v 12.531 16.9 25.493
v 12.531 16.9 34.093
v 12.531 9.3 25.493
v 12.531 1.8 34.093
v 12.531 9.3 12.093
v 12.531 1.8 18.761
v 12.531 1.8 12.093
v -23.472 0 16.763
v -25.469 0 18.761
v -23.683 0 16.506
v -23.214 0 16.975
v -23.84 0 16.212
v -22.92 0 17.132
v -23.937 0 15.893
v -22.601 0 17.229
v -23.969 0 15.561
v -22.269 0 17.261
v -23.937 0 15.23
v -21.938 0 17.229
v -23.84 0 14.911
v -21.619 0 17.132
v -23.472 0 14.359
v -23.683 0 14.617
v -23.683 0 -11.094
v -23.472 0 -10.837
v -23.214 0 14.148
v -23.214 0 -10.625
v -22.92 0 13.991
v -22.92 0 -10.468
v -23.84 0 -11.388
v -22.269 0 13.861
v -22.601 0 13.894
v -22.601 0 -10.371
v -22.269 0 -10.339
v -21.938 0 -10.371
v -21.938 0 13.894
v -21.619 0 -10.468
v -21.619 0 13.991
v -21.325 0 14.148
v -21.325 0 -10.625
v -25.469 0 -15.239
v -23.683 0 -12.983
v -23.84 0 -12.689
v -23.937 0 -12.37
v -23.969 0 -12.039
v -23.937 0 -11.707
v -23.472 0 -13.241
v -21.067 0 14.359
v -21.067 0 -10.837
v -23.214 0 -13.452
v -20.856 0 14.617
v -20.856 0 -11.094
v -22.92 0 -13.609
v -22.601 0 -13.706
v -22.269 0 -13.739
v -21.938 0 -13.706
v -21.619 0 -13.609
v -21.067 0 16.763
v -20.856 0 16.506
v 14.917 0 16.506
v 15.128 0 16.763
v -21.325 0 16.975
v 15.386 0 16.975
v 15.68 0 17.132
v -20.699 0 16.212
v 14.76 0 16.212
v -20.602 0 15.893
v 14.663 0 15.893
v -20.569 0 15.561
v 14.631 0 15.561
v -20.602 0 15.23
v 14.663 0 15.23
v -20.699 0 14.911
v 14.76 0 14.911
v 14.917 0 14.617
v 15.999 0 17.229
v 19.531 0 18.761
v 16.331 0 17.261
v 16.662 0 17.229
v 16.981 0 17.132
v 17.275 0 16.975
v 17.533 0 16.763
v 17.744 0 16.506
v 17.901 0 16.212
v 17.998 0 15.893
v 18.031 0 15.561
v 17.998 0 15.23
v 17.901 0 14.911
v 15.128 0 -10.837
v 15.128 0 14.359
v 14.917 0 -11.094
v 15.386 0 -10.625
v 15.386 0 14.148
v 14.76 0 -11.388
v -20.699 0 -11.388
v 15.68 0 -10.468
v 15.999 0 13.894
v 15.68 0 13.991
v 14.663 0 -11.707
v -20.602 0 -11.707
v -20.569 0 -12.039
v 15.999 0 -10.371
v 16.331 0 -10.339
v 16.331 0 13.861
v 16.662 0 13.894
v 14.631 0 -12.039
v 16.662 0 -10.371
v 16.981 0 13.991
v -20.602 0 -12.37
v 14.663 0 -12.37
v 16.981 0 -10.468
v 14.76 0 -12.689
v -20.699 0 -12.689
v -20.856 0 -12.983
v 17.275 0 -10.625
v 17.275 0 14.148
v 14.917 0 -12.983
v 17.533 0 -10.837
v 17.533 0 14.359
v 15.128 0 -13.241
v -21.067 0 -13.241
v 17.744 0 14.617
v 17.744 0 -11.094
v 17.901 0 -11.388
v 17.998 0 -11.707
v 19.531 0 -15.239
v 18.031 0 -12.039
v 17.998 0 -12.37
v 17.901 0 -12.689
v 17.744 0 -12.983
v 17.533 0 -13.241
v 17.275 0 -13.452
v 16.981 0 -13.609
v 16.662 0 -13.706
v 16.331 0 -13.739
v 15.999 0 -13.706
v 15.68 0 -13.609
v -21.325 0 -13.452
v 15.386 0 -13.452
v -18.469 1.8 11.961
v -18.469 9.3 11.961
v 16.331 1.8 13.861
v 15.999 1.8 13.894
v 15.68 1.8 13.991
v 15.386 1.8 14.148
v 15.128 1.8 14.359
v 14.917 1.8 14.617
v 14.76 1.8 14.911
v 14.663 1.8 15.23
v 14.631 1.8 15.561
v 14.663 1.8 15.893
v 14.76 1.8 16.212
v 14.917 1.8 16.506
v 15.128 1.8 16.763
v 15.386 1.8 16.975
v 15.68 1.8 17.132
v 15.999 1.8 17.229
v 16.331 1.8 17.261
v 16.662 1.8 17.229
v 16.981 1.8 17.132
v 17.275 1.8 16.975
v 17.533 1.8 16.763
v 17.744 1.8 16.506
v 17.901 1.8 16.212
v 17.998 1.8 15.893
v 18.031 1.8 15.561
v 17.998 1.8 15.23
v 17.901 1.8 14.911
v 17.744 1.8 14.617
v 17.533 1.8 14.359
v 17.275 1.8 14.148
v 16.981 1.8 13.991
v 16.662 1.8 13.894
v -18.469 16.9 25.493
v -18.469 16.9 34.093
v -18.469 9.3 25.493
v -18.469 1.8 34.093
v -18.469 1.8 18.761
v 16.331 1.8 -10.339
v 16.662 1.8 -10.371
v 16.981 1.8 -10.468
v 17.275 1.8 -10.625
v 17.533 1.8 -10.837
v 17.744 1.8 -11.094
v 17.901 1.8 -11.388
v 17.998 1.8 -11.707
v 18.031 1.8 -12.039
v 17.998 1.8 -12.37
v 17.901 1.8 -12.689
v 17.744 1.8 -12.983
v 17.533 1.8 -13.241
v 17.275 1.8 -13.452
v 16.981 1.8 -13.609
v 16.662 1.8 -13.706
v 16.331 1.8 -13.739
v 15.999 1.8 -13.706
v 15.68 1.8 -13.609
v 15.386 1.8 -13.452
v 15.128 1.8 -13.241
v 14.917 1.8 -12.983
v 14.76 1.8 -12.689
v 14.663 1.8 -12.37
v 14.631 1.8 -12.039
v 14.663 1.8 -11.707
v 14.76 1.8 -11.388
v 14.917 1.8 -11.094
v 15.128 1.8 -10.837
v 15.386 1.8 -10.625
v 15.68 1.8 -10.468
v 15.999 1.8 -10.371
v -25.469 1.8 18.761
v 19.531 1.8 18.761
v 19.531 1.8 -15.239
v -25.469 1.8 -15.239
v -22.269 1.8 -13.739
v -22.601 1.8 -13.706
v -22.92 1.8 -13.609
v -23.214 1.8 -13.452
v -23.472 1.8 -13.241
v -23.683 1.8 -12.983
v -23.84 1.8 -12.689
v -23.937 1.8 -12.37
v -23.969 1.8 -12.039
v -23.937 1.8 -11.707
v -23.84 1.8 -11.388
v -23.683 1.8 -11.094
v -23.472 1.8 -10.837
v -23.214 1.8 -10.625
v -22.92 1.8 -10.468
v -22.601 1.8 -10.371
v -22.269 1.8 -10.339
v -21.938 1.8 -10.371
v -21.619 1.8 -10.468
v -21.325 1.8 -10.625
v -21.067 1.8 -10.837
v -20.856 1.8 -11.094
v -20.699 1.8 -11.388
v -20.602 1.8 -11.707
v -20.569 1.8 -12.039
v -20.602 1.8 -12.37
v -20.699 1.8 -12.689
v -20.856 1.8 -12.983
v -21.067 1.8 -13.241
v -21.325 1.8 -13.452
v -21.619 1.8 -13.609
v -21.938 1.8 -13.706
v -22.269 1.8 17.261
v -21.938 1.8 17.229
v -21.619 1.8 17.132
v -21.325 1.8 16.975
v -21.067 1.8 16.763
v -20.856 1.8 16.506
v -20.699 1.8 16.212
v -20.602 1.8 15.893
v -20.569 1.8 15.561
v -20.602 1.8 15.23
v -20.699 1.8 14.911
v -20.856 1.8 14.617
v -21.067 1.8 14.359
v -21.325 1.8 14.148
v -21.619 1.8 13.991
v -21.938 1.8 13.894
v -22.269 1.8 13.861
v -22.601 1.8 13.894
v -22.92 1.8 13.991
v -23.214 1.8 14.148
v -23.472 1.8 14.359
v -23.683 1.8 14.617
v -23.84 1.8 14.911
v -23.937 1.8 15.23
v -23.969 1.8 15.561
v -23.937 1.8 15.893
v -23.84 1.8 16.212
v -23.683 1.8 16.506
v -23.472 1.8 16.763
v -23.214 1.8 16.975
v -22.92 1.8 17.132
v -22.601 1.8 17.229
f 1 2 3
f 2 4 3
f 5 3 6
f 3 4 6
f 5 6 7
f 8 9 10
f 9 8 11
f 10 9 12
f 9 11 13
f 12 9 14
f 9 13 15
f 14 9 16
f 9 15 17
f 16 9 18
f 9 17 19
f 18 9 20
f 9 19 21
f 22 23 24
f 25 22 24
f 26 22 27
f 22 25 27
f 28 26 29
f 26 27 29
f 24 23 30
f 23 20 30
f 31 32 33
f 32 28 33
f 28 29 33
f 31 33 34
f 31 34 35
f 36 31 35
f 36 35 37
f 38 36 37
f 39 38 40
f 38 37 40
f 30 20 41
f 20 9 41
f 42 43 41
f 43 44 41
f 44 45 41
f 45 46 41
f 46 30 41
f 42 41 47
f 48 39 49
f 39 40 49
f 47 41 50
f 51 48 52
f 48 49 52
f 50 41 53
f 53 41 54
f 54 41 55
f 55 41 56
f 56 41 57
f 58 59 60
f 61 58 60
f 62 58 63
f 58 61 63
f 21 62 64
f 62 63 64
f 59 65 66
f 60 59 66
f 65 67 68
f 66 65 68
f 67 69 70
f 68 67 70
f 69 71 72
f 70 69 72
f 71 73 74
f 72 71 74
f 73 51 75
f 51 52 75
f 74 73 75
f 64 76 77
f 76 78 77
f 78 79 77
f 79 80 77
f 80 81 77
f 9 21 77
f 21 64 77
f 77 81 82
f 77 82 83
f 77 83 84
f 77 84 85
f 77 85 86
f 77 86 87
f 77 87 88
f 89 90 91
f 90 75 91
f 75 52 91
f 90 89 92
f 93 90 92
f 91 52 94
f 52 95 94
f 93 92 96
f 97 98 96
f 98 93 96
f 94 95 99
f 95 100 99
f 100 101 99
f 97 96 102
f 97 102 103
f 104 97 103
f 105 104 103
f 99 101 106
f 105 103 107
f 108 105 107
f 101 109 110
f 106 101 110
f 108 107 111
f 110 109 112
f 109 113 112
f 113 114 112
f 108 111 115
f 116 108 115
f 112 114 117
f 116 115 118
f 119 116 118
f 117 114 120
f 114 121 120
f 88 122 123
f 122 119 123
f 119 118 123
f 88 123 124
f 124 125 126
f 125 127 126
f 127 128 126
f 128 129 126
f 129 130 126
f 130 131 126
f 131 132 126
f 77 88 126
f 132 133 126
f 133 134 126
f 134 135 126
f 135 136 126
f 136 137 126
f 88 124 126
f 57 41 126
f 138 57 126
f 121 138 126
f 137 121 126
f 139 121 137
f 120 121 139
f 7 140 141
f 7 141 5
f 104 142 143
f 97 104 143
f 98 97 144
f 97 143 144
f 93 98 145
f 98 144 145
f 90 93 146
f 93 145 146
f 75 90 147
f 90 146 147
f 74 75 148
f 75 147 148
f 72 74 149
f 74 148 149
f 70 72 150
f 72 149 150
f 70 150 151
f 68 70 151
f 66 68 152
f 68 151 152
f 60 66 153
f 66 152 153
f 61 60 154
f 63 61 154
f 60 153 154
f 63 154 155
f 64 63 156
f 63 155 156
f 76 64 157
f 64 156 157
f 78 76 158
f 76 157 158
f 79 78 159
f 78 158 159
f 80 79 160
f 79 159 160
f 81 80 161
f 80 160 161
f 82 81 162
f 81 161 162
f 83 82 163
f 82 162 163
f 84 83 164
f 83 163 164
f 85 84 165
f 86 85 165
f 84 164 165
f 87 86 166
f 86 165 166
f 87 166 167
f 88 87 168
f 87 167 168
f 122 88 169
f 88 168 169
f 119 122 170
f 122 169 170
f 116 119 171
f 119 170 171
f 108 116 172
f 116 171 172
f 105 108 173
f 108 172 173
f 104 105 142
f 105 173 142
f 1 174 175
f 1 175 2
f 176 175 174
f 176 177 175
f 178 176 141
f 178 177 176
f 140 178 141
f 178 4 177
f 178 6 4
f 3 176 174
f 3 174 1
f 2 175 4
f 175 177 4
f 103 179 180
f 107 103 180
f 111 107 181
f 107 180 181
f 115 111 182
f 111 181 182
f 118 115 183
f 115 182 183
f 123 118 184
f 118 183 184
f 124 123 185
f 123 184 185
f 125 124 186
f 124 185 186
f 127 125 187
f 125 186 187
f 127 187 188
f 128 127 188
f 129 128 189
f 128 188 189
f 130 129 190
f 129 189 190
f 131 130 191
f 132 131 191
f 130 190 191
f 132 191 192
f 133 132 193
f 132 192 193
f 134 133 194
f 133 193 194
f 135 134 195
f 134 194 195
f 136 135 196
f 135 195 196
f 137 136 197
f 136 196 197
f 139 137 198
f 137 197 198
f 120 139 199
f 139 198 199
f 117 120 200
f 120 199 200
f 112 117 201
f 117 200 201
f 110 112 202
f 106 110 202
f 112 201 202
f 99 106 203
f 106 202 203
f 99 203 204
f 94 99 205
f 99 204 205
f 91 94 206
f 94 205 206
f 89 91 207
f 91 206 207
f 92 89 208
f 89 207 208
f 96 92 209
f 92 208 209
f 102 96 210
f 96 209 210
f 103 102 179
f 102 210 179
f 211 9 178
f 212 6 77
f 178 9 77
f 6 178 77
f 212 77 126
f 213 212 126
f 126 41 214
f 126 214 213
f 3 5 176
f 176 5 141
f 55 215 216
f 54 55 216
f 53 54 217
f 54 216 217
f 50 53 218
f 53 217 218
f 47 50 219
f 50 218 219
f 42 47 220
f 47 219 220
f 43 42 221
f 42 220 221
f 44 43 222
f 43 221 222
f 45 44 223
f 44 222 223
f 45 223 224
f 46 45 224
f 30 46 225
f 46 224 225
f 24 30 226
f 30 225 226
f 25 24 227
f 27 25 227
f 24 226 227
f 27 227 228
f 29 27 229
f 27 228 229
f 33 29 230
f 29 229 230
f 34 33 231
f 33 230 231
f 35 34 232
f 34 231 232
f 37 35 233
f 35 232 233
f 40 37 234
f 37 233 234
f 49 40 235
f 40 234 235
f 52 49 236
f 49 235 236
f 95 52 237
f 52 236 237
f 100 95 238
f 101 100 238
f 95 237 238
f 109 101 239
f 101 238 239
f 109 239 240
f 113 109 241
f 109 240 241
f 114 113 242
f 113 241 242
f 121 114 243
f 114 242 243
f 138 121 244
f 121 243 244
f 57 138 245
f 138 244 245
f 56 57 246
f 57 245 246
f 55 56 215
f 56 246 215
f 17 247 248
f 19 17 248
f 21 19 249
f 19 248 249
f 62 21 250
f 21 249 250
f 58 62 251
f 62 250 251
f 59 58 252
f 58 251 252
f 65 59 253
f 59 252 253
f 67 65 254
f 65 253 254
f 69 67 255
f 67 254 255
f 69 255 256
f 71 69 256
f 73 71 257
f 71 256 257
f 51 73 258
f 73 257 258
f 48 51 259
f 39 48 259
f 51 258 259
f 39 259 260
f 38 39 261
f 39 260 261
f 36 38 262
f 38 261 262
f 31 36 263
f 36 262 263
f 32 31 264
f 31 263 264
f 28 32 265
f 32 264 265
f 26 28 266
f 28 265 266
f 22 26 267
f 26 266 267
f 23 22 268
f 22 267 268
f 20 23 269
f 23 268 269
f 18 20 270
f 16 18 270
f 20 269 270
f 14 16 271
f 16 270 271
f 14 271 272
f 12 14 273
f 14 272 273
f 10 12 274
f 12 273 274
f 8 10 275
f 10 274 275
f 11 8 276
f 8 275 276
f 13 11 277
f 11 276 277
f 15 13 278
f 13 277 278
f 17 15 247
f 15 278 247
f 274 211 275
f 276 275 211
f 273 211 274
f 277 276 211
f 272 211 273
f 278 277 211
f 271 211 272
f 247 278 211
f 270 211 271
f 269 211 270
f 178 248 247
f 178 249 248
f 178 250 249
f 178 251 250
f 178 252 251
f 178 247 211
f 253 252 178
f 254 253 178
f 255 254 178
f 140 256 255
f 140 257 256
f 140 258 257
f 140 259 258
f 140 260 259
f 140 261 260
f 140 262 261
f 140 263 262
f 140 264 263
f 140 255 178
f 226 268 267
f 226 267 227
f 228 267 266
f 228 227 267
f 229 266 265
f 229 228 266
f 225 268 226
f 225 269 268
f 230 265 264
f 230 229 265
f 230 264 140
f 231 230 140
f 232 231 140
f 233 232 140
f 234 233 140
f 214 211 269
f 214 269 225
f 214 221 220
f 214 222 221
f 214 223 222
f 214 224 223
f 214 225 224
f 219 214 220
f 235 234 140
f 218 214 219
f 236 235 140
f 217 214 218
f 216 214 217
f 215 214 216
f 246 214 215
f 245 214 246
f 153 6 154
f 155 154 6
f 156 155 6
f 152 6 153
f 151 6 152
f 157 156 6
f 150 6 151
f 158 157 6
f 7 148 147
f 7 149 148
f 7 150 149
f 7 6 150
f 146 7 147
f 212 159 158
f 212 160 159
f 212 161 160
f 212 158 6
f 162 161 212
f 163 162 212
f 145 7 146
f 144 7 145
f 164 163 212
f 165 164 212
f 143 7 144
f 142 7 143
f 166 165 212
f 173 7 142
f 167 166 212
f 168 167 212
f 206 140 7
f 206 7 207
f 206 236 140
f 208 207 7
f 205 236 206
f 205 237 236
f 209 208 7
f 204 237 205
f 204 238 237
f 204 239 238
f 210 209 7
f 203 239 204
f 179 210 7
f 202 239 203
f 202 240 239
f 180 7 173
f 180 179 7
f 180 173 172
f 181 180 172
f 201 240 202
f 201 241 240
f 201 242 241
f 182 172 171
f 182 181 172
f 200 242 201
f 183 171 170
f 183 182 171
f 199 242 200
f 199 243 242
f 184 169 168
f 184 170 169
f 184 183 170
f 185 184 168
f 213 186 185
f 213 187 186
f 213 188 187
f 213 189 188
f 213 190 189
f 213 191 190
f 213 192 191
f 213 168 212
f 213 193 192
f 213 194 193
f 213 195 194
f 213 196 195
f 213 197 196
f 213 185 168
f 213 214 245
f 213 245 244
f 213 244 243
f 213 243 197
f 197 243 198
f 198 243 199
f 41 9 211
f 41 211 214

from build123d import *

# Parameters (mm, degrees)
SZKIC1_W                    = 45
SZKIC1_H                    = 34
DODANIE_WYCI_GNI_CIE1_DEPTH = 1.8
SZKIC2_R                    = 1.7
WYTNIJ_WYCI_GNI_CIE1_DEPTH  = 1.8
DODANIE_WYCI_GNI_CIE2_DEPTH = 7.5
SZKIC4_W                    = 31
SZKIC4_H                    = 8.6
DODANIE_WYCI_GNI_CIE3_DEPTH = 7.6


with BuildPart() as part:
    # Szkic1 → Dodanie-wyciągnięcie1 (new body)
    with BuildSketch(Plane(origin=(0, 0, 0), x_dir=(1, 0, 0), z_dir=(0, 1, 0))):
        with Locations((-2.969453376, -1.761254019)):
            Rectangle(SZKIC1_W, SZKIC1_H)
    extrude(amount=DODANIE_WYCI_GNI_CIE1_DEPTH)

    # Szkic2 → Wytnij-wyciągnięcie1 (cut)
    with BuildSketch(Plane(origin=(0, 1.8, 0), x_dir=(1, 0, 0), z_dir=(0, 1, 0))):
        with Locations(Location((-22.269453376, -15.561254019, 0), (0, 0, 270))):
            Circle(SZKIC2_R)
        with Locations(Location((16.330546624, -15.561254019, 0), (0, 0, 90))):
            Circle(SZKIC2_R)
        with Locations(Location((16.330546624, 12.038745981, 0), (0, 0, 270))):
            Circle(SZKIC2_R)
        with Locations(Location((-22.269453376, 12.038745981, 0), (0, 0, 90))):
            Circle(SZKIC2_R)
    extrude(amount=-WYTNIJ_WYCI_GNI_CIE1_DEPTH, mode=Mode.SUBTRACT)

    # Szkic3 → Dodanie-wyciągnięcie2 (add)
    with BuildSketch(Plane(origin=(0, 1.8, 0), x_dir=(1, 0, 0), z_dir=(0, 1, 0))):
        Polygon((-18.469453376, -34.093184344), (-18.469453376, -11.961254019), (12.530546624, -12.093184344), (12.530546624, -34.093184344), align=None)
    extrude(amount=DODANIE_WYCI_GNI_CIE2_DEPTH)

    # Szkic4 → Dodanie-wyciągnięcie3 (add)
    with BuildSketch(Plane(origin=(0, 9.3, 0), x_dir=(1, 0, 0), z_dir=(0, 1, 0))):
        with Locations((-2.969453376, -29.793184344)):
            Rectangle(SZKIC4_W, SZKIC4_H)
    extrude(amount=DODANIE_WYCI_GNI_CIE3_DEPTH)


solid = part.part
